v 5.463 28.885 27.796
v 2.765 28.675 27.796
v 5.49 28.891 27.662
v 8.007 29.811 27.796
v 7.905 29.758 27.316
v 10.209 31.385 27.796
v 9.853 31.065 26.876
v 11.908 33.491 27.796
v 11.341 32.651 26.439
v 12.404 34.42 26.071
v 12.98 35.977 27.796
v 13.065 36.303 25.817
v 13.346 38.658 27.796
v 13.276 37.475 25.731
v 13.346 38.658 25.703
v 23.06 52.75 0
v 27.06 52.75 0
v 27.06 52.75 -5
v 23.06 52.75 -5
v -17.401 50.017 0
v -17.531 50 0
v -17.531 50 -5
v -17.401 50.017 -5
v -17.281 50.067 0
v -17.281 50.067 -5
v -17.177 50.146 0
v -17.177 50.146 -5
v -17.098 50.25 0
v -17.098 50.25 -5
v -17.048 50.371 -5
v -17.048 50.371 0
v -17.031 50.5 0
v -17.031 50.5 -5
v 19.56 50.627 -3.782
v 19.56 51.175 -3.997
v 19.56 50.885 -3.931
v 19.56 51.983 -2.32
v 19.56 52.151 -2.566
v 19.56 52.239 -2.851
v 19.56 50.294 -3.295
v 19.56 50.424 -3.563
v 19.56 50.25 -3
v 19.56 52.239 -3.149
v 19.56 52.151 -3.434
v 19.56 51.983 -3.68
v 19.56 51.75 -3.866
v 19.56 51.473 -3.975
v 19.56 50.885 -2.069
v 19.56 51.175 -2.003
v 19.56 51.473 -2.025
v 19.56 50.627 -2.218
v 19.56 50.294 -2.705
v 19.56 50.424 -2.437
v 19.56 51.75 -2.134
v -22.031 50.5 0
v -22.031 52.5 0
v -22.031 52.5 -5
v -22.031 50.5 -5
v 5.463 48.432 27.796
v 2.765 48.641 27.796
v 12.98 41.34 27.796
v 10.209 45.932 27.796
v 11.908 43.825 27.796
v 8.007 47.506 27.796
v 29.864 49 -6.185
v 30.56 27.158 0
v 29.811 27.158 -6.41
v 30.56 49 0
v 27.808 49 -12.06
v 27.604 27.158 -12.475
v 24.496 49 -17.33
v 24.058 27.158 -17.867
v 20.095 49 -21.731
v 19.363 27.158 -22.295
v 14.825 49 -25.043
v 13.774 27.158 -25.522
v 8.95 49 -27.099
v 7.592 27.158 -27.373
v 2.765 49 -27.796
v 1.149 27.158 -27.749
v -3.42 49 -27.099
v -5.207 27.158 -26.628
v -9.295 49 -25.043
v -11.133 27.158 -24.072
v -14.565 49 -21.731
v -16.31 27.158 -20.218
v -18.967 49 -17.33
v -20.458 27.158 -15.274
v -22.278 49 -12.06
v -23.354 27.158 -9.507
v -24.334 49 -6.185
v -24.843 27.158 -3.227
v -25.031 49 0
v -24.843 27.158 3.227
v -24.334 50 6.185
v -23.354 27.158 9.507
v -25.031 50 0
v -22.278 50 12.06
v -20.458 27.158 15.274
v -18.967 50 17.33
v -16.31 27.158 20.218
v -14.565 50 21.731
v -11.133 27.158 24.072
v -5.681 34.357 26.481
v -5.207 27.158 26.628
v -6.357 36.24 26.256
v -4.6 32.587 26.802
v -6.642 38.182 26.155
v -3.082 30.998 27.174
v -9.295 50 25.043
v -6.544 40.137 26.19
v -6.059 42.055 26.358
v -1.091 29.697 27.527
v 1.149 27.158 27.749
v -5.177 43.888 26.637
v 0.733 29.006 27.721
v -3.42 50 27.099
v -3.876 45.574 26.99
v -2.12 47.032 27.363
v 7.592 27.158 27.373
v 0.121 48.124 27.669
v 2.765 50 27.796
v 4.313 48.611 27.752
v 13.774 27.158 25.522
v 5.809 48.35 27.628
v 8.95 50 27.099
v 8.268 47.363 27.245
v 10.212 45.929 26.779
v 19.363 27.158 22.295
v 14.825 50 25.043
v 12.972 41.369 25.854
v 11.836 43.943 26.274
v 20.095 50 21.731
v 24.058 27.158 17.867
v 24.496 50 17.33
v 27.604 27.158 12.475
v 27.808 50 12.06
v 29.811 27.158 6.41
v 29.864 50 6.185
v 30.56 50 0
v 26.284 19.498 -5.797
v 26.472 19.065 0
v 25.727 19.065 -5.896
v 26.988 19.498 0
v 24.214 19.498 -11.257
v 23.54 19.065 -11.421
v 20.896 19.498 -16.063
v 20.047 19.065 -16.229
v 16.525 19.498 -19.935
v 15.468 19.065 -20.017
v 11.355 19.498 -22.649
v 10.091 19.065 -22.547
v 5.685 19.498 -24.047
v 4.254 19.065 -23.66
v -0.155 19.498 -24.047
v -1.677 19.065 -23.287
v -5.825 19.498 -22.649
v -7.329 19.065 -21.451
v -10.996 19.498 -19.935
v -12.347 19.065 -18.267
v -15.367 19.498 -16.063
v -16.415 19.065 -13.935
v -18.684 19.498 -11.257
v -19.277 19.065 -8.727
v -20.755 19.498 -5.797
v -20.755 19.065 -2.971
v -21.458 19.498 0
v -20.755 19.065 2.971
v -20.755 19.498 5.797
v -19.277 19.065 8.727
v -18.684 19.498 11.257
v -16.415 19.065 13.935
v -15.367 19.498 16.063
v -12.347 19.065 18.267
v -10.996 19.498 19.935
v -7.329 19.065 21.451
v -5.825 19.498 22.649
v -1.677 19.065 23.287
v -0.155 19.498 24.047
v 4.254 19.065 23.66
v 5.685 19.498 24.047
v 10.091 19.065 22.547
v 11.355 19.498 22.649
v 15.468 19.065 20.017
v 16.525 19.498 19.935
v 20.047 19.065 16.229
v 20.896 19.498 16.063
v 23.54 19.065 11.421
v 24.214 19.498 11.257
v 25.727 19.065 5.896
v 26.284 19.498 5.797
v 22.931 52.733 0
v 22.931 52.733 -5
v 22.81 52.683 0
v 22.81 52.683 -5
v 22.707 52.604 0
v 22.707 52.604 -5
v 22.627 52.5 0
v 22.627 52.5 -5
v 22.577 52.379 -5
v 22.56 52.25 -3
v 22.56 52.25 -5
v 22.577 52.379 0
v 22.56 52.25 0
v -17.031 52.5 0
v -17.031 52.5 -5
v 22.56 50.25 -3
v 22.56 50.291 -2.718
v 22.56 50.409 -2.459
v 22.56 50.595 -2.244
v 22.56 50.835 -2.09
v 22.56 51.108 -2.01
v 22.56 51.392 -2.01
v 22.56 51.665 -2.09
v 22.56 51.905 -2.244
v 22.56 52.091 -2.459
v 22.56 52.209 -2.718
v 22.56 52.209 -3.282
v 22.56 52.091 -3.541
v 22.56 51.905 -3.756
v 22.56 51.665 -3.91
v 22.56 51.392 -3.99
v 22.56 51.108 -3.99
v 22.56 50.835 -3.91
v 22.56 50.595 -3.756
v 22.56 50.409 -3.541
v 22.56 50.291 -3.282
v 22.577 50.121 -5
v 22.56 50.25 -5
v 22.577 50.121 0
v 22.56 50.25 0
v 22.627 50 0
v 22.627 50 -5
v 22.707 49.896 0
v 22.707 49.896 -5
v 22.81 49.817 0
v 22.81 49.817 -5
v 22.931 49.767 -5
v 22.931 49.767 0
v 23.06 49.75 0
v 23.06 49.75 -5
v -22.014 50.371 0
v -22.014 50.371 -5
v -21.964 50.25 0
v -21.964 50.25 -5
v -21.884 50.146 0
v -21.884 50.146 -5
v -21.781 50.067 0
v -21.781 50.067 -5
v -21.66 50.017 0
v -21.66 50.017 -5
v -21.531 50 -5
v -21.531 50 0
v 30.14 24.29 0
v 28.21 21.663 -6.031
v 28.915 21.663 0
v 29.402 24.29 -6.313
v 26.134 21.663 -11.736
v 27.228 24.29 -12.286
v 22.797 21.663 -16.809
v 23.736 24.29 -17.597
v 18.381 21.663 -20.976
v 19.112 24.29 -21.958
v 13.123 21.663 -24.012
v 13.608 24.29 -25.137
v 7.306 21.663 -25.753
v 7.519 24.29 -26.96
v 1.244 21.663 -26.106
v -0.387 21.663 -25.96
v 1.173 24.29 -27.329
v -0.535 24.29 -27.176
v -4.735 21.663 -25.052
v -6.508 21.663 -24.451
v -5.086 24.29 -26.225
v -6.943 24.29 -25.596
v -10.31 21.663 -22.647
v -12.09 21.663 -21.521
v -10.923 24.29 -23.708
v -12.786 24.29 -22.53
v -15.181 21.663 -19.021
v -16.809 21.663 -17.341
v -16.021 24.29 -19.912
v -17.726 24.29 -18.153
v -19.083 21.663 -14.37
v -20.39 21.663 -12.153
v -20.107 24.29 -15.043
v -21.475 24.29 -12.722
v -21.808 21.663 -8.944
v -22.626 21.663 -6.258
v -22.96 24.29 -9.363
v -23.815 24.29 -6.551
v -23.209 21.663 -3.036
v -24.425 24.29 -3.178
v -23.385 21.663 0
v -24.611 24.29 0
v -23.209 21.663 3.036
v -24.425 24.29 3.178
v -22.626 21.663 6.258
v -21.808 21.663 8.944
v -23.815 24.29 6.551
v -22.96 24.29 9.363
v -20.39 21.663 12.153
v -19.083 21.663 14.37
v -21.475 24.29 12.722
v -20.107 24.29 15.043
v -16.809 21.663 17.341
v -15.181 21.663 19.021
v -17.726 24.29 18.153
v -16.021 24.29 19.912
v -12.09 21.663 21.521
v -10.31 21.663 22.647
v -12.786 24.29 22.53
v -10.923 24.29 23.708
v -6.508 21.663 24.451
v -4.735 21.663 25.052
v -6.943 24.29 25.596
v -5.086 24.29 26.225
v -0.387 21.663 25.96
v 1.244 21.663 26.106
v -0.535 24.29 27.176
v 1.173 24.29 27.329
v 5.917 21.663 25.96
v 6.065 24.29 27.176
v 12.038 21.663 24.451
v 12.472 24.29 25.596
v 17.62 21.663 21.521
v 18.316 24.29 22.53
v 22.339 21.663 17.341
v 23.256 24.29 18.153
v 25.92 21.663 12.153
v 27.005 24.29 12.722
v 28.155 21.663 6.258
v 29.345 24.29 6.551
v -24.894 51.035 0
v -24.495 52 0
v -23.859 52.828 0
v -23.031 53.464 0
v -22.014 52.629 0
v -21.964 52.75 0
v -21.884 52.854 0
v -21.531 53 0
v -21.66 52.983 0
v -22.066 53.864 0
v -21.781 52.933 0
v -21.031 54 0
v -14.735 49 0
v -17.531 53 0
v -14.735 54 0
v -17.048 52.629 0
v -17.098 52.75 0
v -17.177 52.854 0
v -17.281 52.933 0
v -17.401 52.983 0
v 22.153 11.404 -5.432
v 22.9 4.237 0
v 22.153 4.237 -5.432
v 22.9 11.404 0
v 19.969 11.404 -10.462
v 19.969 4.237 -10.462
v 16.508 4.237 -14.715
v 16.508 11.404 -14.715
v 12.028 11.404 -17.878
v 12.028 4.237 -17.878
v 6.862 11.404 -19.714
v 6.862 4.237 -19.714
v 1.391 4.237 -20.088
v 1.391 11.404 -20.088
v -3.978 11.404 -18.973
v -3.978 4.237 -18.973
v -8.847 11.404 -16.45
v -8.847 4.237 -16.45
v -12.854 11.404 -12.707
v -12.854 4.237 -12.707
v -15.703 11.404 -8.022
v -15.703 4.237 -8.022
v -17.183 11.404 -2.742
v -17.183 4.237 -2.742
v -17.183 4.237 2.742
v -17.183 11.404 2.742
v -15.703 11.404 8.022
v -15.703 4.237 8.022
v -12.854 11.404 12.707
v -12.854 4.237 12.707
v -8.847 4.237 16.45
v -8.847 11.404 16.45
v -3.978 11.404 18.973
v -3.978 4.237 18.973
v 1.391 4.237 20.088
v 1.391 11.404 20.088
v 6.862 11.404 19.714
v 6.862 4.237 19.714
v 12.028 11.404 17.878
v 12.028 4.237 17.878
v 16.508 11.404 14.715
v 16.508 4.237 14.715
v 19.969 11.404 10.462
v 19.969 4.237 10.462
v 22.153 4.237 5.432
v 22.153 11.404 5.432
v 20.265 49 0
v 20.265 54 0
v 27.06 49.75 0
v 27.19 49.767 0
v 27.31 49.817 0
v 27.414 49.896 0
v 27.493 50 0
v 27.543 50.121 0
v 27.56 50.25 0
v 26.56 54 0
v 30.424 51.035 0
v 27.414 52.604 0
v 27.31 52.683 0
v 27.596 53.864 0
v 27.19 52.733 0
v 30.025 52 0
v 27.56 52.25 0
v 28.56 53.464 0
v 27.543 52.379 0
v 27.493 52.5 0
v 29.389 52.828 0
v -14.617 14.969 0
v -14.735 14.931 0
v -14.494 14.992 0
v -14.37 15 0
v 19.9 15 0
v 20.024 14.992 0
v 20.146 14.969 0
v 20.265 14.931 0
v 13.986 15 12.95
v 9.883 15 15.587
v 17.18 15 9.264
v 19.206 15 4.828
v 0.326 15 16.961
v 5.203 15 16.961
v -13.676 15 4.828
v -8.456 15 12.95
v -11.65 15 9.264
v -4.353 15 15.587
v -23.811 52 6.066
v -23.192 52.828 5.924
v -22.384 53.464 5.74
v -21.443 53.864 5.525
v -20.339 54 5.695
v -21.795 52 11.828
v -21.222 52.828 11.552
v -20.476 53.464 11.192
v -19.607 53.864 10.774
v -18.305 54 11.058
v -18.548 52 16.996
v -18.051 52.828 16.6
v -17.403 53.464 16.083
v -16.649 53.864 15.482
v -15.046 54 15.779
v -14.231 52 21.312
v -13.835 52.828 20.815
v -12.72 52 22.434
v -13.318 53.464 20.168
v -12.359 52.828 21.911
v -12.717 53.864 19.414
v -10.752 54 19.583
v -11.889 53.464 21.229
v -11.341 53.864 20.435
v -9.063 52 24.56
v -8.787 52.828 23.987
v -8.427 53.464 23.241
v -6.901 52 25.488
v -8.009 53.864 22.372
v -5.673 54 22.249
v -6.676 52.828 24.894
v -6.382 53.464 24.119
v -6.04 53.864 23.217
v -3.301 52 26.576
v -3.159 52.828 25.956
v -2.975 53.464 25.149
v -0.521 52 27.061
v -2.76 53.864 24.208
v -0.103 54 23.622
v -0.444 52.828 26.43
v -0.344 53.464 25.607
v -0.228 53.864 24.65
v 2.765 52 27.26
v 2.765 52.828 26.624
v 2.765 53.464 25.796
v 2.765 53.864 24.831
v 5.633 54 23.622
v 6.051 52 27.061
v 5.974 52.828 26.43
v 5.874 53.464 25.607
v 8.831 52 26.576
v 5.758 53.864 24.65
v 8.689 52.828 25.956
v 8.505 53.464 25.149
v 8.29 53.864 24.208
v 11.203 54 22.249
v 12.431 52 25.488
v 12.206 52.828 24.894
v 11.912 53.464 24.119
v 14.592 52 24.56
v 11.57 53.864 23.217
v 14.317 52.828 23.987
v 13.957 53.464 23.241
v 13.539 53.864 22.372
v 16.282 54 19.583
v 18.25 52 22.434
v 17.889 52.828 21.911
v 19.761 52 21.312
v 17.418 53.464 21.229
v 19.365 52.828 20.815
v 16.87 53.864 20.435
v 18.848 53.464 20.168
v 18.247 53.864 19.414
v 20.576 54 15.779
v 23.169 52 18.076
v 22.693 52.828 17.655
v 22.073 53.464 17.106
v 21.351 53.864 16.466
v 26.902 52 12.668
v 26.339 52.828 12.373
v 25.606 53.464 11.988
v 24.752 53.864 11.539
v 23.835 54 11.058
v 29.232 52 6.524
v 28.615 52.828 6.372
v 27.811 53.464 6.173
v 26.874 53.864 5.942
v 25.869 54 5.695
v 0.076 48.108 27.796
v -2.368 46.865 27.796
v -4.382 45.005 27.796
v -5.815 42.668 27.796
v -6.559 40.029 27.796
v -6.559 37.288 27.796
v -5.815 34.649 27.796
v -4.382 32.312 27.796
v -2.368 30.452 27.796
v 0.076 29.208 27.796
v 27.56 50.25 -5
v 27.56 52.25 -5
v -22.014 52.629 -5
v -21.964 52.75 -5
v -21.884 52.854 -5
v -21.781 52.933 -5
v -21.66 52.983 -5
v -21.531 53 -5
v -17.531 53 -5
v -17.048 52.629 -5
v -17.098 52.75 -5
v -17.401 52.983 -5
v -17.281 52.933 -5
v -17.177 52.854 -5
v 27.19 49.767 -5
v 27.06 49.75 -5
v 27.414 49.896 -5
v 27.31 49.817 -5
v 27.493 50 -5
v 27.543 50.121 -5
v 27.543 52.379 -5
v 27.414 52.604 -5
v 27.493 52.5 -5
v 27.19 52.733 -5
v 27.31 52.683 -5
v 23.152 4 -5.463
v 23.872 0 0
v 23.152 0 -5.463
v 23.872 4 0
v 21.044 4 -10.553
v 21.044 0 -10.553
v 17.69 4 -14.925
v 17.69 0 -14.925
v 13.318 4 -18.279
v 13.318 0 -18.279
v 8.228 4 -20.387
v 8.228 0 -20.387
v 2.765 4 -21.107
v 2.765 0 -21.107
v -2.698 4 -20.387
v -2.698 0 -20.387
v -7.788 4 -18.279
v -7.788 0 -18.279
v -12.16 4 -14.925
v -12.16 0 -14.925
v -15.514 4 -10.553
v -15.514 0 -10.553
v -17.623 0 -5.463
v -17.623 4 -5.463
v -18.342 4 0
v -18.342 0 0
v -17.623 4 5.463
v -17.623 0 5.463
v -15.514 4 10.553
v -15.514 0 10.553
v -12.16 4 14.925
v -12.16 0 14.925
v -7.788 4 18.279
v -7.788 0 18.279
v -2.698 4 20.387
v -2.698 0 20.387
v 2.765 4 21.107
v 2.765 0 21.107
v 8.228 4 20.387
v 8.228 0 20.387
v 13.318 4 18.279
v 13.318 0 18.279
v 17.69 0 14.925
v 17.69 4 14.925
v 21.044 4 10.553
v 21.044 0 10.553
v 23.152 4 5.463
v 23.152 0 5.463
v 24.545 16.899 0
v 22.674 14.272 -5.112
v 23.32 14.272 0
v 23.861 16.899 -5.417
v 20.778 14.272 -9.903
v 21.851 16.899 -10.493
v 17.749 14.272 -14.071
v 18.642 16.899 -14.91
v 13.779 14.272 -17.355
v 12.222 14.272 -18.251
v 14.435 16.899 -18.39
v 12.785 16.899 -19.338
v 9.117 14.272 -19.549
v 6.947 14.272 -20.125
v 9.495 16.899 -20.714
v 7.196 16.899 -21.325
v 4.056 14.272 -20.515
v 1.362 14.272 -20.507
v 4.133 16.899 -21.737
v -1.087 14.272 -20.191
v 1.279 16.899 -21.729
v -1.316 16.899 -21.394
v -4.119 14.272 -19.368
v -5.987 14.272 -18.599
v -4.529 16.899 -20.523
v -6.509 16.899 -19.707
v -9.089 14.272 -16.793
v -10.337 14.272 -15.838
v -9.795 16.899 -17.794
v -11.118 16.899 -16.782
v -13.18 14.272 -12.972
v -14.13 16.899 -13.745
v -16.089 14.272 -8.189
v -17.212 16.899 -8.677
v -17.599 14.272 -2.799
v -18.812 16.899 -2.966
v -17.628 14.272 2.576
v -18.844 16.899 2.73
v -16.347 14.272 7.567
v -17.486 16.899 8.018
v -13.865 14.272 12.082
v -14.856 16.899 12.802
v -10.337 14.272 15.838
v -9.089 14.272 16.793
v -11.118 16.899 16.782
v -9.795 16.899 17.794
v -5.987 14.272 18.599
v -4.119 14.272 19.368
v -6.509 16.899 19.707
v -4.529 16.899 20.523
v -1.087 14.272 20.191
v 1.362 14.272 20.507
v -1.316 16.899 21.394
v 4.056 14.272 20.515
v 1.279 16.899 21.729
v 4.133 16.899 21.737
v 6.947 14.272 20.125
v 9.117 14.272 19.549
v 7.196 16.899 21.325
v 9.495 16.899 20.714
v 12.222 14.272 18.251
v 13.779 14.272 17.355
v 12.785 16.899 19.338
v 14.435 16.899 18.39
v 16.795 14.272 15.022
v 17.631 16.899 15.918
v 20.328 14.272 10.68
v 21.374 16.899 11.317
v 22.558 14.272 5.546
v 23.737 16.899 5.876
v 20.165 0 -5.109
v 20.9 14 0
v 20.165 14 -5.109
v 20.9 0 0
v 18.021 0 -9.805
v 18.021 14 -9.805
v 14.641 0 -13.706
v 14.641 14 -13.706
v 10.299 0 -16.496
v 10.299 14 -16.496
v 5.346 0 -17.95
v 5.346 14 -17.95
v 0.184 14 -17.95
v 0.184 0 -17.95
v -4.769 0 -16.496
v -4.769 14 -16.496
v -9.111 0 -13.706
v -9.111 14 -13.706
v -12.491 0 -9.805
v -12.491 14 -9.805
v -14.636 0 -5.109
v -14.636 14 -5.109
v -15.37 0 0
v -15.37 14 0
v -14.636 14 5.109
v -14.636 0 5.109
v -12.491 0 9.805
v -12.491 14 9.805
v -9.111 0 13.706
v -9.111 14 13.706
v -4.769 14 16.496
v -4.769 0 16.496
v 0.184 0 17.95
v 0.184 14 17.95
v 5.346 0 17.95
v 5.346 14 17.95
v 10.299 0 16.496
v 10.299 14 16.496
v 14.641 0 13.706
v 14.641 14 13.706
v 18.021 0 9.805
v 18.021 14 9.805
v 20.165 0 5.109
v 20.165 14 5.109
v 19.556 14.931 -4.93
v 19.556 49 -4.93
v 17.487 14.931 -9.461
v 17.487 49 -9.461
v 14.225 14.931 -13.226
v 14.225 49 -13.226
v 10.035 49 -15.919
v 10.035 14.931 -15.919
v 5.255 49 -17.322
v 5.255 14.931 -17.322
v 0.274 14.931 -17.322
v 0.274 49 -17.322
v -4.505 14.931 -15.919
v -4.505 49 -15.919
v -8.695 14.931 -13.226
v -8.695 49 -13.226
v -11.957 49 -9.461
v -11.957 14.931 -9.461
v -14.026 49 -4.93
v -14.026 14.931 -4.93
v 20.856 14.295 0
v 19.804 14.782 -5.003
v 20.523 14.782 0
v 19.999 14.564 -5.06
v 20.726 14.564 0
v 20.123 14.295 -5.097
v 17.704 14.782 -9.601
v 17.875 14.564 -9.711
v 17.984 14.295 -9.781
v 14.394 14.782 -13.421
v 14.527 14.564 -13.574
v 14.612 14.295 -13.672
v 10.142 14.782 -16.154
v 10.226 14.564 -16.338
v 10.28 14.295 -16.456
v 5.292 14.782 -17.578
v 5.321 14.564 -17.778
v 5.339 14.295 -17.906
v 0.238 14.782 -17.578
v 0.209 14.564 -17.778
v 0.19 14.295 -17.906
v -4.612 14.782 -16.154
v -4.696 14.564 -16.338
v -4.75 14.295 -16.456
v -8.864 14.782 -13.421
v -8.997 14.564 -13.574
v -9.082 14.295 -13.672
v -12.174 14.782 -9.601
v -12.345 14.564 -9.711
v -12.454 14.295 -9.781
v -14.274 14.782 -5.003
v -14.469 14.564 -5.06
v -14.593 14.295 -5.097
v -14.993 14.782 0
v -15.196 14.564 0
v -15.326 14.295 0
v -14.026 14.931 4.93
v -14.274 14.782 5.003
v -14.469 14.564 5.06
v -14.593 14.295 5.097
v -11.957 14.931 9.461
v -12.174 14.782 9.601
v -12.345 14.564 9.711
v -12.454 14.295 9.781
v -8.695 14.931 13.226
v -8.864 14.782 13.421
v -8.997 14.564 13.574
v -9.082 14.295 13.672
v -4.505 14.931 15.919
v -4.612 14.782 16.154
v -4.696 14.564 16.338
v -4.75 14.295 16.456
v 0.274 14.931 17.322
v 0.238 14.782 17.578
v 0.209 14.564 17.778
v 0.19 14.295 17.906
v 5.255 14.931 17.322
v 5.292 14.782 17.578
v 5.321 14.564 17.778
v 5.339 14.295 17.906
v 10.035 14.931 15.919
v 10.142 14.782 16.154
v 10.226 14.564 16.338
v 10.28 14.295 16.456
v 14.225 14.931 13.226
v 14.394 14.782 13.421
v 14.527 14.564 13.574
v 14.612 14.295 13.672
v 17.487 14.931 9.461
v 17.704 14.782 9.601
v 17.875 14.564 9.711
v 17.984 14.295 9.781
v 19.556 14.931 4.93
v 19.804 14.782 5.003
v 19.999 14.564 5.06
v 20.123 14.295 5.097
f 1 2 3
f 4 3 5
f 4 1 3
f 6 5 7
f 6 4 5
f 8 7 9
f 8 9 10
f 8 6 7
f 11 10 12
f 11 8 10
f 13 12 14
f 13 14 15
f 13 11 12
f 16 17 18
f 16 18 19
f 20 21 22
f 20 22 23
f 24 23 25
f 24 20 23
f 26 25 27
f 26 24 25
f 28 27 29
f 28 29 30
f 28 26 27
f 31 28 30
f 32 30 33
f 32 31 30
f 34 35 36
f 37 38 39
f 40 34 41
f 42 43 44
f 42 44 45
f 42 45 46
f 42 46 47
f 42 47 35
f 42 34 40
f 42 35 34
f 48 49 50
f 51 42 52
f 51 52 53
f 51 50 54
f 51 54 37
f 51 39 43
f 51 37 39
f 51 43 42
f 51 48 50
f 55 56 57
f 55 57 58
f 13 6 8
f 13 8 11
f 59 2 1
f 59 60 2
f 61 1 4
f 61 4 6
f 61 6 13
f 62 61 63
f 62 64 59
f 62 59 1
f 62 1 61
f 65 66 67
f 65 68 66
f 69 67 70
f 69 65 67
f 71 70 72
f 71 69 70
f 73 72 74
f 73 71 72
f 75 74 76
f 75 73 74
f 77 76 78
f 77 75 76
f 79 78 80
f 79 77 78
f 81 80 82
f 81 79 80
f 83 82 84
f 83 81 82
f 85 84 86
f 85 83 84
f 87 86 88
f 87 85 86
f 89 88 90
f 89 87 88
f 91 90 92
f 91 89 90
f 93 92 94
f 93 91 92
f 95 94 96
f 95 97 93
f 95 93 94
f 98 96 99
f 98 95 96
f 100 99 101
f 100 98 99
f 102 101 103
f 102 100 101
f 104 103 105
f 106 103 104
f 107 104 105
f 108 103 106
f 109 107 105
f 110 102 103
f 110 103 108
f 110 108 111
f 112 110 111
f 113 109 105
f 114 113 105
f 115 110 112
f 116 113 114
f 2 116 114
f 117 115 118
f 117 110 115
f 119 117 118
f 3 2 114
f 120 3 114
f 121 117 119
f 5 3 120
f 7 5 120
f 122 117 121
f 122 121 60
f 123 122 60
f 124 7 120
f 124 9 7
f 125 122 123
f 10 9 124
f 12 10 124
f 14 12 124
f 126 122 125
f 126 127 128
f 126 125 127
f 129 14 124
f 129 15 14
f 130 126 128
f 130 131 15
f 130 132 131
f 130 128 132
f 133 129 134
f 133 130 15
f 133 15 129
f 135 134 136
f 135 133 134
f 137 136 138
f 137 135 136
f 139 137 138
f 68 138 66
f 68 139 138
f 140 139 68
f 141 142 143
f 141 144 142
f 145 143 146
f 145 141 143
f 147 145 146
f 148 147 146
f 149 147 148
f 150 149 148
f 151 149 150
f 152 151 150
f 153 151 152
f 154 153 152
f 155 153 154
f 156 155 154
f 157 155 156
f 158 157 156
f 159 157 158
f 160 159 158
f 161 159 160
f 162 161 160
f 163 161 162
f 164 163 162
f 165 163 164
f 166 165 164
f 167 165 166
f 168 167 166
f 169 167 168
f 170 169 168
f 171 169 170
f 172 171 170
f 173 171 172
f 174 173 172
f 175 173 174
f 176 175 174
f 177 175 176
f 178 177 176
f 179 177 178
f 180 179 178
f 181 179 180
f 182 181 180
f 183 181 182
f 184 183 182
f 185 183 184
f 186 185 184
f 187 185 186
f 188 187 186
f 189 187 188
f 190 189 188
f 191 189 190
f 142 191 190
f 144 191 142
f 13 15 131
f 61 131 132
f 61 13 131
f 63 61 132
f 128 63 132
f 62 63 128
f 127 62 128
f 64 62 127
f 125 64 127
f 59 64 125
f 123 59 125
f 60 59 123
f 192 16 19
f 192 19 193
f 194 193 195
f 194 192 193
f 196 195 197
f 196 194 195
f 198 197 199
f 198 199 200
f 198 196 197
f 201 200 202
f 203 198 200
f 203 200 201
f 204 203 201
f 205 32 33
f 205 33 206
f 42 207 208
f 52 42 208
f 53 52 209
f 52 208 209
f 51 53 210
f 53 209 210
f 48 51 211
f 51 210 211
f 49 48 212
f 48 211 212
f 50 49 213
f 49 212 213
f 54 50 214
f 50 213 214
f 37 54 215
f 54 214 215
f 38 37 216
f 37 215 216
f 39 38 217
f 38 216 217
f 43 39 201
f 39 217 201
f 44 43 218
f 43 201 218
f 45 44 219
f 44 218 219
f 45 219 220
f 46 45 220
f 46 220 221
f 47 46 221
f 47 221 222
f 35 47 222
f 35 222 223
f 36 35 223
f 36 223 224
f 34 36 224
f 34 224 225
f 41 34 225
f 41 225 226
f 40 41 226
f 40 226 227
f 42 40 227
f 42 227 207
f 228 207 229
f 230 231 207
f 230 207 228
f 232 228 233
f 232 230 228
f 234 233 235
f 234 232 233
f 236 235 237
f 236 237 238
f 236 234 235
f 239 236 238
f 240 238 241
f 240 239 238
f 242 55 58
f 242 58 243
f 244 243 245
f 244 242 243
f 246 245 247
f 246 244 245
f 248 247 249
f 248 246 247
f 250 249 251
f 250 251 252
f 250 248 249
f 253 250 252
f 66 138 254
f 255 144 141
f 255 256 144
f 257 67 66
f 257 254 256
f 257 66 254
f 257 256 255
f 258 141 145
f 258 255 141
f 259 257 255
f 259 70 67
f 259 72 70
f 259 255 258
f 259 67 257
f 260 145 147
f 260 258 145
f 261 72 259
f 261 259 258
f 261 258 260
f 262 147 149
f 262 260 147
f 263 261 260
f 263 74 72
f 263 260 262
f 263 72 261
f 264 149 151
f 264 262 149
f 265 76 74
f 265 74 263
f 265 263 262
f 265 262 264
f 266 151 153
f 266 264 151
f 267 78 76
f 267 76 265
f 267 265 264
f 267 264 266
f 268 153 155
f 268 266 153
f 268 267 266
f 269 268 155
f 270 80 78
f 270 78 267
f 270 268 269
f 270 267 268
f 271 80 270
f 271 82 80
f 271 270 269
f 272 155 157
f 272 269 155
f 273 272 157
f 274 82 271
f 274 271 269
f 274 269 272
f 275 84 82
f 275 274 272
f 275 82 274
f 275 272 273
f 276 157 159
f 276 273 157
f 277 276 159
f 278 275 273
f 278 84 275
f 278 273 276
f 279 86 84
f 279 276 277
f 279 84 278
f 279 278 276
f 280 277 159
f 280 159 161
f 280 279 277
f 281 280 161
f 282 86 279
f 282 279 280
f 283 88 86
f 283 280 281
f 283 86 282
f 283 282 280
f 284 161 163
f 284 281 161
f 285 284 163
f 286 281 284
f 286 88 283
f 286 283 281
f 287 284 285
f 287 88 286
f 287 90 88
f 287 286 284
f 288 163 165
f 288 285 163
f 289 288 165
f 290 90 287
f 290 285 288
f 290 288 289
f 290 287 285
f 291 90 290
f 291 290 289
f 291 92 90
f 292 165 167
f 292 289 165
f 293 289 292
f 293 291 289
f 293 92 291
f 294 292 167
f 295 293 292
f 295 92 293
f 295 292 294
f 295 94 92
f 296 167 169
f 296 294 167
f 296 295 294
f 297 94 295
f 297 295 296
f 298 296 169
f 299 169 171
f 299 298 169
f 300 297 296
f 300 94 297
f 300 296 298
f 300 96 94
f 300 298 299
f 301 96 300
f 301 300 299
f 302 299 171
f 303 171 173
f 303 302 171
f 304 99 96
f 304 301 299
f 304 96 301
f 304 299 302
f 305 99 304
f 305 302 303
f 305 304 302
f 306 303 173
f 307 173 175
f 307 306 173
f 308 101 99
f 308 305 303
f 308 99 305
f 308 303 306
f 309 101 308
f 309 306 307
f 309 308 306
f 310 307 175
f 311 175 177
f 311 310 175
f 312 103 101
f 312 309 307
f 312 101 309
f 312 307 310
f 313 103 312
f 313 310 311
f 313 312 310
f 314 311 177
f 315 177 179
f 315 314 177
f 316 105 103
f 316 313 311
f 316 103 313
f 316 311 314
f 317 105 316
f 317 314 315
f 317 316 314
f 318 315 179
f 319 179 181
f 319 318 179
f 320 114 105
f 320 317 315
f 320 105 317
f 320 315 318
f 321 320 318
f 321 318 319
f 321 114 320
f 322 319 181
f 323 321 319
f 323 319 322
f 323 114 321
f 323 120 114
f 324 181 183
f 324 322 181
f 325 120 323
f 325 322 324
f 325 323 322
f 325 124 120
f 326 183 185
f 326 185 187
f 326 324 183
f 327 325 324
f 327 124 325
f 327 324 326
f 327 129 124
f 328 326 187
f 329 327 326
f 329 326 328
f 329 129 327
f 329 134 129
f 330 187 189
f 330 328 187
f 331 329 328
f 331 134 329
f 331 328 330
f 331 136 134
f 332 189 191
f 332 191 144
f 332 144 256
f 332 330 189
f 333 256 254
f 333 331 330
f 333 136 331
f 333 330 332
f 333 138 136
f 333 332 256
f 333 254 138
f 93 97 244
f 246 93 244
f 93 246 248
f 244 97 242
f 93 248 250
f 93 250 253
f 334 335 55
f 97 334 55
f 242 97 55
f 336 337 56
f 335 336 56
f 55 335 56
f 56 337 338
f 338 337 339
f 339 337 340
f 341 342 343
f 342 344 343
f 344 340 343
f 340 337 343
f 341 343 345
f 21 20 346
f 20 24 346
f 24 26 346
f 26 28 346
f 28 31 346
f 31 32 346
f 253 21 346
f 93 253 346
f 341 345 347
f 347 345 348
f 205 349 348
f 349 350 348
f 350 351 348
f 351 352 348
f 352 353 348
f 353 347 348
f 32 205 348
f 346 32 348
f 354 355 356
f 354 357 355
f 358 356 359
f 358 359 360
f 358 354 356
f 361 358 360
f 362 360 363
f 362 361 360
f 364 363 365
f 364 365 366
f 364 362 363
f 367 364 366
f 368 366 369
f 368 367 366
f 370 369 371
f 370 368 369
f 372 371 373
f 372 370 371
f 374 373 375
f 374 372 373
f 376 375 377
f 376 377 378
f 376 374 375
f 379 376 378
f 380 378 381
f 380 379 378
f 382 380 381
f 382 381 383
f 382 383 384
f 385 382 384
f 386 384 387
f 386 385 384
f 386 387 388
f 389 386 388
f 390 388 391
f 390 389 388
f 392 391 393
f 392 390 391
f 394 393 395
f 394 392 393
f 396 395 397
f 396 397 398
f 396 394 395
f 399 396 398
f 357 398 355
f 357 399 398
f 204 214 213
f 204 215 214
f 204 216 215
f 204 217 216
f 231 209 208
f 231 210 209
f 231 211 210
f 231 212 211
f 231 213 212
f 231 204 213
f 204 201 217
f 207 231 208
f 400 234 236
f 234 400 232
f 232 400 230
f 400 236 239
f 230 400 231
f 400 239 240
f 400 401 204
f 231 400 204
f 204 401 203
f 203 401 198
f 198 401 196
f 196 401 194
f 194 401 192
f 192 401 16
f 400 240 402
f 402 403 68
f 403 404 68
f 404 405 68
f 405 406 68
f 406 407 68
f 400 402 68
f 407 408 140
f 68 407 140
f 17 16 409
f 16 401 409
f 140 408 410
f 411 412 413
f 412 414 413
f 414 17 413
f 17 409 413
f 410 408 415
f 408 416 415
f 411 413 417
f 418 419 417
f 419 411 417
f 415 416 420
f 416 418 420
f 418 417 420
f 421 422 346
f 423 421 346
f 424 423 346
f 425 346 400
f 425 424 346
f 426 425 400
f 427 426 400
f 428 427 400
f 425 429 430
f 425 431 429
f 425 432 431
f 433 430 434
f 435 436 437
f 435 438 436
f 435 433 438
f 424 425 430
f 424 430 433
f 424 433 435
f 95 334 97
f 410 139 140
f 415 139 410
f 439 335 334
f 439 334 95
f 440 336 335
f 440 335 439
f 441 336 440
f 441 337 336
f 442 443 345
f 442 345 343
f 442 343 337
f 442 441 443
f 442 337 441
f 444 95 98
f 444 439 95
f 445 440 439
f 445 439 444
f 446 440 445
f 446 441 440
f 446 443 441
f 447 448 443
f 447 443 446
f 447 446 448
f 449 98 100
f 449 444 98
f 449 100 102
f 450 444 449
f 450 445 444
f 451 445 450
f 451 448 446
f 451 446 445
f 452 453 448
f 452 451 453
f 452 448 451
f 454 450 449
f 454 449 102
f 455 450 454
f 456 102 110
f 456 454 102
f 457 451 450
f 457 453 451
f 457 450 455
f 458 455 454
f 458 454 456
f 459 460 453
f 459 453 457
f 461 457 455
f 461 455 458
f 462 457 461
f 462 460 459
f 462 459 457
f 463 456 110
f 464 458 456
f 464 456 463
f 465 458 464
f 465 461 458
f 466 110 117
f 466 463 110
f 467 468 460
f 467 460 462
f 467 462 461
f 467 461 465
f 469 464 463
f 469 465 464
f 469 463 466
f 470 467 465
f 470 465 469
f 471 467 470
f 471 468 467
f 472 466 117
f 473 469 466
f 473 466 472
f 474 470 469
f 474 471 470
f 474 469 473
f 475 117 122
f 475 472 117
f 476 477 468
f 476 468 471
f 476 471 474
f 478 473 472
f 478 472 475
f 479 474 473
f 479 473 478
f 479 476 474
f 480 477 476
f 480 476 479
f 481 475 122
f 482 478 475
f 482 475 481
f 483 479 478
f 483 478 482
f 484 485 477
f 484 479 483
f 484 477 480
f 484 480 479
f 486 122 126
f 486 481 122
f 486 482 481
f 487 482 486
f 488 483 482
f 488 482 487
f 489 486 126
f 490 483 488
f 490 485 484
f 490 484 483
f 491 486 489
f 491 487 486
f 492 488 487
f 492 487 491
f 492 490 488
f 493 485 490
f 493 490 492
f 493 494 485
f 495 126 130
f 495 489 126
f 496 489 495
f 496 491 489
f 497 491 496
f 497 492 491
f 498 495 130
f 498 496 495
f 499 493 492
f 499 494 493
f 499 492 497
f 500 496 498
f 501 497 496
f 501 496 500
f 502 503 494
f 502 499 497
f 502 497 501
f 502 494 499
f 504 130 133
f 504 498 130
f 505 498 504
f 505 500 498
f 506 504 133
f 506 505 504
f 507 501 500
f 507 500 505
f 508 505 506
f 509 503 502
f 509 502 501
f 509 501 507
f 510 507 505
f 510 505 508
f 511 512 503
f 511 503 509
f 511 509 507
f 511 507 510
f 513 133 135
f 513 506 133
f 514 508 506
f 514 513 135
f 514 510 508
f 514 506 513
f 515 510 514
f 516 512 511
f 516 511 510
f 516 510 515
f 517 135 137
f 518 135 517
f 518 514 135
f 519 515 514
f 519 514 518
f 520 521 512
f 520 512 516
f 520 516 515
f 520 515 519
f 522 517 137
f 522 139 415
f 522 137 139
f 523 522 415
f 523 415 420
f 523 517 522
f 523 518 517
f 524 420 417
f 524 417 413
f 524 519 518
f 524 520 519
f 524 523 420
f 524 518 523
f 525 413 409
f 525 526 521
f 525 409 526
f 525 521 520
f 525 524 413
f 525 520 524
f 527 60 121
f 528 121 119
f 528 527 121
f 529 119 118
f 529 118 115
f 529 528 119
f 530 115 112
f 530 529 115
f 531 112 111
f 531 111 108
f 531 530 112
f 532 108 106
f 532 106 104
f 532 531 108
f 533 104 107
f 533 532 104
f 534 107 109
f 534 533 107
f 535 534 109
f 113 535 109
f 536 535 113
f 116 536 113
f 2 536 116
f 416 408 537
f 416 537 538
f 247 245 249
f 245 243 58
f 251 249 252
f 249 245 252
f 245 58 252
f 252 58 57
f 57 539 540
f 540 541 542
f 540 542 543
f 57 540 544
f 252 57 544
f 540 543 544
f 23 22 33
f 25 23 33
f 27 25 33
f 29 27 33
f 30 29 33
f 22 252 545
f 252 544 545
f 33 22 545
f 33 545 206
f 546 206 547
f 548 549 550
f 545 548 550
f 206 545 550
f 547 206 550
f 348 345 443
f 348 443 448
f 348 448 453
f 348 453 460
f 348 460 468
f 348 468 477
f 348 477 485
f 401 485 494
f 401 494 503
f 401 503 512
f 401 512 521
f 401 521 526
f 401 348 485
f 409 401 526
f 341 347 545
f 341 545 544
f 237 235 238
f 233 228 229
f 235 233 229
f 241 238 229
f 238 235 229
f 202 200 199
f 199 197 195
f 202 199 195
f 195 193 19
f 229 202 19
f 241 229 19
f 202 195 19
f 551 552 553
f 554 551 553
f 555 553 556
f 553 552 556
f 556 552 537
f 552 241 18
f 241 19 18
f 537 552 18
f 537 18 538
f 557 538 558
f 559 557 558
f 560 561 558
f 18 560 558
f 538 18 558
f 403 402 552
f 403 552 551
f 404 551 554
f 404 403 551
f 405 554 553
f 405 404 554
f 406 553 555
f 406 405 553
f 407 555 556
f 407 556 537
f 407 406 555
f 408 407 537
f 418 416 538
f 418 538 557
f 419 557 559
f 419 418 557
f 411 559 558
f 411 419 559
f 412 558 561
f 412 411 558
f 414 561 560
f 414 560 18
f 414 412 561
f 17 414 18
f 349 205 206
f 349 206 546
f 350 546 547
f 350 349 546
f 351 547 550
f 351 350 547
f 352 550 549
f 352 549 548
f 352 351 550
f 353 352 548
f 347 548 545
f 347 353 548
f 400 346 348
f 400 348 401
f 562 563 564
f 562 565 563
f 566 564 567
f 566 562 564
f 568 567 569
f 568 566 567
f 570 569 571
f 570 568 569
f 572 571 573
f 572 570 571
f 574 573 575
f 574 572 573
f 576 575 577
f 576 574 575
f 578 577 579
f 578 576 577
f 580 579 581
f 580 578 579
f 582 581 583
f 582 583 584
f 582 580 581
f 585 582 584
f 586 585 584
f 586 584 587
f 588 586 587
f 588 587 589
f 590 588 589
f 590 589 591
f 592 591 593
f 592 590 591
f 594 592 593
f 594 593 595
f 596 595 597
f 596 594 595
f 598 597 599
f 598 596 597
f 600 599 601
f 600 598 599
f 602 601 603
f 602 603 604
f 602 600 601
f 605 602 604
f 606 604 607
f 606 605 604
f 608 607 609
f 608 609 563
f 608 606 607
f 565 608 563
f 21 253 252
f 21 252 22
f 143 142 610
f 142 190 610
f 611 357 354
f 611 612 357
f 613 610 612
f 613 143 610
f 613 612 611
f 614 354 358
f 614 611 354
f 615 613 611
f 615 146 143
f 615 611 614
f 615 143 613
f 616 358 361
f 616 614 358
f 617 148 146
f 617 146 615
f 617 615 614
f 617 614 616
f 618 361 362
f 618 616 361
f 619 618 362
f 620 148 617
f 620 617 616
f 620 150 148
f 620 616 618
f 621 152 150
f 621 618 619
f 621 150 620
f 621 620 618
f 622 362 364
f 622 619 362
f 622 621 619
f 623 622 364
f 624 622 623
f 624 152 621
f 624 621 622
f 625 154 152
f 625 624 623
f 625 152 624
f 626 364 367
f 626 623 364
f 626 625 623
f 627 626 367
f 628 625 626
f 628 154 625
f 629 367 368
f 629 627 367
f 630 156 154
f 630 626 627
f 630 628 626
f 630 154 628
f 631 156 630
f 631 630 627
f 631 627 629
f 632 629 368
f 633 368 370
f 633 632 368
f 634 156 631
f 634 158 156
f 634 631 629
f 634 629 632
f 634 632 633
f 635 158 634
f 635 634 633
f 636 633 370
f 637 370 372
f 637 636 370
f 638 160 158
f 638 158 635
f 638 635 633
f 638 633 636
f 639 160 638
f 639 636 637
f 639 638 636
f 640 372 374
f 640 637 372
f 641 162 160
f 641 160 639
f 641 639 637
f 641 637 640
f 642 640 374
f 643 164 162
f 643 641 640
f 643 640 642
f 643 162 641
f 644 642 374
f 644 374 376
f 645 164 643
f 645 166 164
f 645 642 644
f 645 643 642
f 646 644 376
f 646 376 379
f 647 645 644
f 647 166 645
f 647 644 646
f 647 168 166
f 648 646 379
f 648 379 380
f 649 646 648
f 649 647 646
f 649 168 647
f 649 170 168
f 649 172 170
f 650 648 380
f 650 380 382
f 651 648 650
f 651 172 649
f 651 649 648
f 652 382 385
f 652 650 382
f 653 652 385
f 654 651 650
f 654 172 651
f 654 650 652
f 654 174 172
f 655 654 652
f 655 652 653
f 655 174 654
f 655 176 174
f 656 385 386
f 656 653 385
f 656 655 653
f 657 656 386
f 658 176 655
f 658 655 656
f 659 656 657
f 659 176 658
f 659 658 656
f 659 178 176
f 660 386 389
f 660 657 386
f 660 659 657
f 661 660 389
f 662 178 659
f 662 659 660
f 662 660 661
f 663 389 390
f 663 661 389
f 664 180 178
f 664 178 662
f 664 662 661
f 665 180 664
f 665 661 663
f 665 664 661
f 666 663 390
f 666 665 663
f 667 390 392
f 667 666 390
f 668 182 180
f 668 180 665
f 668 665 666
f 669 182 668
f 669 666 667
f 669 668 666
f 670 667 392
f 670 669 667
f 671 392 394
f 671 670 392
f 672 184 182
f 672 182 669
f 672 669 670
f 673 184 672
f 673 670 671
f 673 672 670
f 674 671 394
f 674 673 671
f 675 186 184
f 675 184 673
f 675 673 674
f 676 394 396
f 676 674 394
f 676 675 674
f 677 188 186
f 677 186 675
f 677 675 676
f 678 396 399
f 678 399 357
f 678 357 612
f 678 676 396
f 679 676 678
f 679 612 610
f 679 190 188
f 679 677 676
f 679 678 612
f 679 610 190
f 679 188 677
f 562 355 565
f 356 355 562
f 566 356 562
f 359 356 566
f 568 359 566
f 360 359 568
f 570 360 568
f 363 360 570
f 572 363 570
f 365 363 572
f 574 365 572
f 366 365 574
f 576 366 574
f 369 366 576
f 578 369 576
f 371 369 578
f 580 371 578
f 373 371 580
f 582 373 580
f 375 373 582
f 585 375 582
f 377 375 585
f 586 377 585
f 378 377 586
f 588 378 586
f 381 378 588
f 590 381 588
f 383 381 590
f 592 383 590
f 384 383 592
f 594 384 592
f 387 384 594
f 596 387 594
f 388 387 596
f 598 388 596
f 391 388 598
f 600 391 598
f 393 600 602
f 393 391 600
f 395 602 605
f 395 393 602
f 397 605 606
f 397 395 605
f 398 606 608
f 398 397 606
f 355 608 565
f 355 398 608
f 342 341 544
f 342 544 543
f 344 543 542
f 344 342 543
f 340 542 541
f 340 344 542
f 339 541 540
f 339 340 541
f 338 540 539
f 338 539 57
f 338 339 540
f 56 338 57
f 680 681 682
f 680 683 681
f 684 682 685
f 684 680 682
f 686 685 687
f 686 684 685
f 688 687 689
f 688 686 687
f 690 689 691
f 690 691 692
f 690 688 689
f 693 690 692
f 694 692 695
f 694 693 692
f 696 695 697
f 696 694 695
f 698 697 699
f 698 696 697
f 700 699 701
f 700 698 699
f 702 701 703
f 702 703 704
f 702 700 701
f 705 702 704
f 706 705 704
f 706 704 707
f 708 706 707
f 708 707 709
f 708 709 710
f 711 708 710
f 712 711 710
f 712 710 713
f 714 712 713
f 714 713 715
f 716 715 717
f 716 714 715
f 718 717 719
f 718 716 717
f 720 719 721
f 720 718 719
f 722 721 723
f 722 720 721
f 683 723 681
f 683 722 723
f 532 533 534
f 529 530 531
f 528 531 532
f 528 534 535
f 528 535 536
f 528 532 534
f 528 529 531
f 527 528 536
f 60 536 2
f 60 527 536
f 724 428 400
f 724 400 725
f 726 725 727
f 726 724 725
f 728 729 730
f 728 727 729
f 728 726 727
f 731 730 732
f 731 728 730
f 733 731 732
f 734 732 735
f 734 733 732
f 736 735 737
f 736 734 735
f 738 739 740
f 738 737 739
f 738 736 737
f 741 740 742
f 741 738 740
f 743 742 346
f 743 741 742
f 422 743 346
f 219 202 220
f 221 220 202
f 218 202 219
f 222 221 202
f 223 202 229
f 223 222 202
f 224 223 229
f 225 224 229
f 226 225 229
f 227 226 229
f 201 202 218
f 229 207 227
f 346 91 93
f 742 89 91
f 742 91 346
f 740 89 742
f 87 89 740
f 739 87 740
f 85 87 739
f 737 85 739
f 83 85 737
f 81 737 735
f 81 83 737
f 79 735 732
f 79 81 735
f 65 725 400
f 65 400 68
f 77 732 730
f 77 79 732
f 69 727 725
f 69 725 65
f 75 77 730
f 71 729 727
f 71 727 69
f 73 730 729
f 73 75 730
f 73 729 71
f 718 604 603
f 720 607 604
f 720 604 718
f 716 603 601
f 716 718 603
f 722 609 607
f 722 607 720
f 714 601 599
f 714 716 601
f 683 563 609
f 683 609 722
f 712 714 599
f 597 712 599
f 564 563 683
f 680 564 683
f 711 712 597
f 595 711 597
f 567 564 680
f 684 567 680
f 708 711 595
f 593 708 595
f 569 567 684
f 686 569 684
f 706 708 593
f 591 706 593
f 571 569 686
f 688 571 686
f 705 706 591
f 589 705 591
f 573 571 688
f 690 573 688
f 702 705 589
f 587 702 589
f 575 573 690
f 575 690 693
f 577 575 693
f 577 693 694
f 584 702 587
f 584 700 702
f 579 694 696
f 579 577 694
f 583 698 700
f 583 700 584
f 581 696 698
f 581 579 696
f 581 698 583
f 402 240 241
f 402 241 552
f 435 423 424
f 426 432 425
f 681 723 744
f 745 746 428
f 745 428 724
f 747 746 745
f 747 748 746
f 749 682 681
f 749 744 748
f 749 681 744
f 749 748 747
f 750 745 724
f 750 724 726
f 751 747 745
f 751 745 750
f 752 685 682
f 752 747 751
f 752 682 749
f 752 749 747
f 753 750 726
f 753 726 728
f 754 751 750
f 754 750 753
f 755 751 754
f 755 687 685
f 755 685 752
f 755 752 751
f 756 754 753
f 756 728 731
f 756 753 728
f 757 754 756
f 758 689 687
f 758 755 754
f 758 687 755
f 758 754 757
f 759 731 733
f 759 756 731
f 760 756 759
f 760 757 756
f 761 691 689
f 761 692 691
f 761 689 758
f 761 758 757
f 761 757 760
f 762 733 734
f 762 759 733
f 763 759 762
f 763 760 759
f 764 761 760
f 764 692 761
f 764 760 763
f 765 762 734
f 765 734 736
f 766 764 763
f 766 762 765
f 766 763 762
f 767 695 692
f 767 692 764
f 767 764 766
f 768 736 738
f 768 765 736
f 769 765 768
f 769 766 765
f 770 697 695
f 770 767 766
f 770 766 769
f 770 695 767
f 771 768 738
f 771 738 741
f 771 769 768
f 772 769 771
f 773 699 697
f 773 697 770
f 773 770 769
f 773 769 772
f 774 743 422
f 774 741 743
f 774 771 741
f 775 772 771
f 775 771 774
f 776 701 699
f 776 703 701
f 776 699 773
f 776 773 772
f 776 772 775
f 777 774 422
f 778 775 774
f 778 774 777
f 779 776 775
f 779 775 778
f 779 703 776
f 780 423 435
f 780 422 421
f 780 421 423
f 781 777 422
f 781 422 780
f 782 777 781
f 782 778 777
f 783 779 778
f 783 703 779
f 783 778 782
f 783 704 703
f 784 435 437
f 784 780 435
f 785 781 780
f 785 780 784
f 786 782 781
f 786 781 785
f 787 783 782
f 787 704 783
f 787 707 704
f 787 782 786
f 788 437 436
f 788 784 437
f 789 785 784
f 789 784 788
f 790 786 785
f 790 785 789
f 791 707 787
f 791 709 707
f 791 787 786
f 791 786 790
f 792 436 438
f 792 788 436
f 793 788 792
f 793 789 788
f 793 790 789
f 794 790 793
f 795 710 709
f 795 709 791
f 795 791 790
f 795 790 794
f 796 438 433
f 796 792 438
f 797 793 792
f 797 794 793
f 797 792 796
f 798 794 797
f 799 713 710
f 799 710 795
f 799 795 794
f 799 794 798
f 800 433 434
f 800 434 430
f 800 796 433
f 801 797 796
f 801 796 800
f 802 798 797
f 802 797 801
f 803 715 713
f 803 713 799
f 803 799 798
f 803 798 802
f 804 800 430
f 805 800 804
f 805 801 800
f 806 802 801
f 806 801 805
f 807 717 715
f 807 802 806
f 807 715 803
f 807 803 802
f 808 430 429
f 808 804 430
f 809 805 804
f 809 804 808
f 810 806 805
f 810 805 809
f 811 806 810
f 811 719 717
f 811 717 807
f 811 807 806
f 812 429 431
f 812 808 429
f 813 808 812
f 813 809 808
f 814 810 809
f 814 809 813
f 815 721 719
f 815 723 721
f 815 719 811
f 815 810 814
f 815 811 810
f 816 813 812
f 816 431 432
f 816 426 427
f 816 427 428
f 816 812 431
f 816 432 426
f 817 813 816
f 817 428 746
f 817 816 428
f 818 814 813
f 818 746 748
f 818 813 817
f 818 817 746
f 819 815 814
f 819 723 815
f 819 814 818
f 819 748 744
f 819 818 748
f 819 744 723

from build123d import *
from build123d.topology import SkipClean

# Parameters (mm, degrees)
SKETCH10_R              = 10
BOSS_EXTRUDE1_DEPTH     = 5
CUT_EXTRUDE3_DEPTH      = 45
CUT_EXTRUDE3_DEPTH_BACK = 20
CUT_EXTRUDE5_DEPTH      = 5
BOSS_EXTRUDE2_DEPTH     = 5
SKETCH14_R              = 1
BOSS_EXTRUDE3_DEPTH     = 3


with BuildPart() as part:
    # Sketch1 → Revolve1 (revolve)
    with BuildSketch(Plane.XY):
        with BuildLine():
            Line((20.9, 0), (23.871591838, 0))
            Line((23.871591838, 0), (23.871591838, 4))
            Line((23.871591838, 4), (22.9, 4.236662843))
            Line((22.9, 4.236662843), (22.9, 11.404308102))
            ThreePointArc((22.9, 11.404308102), (23.83692213, 15.63049072), (26.472123903, 19.064752533))
            Line((26.472123903, 19.064752533), (26.988320528, 19.497892931))
            ThreePointArc((26.988320528, 19.497892931), (29.623522302, 22.932154745), (30.560444431, 27.158337362))
            Line((30.560444431, 27.158337362), (30.560444431, 50))
            ThreePointArc((30.560444431, 50), (29.388871556, 52.828427125), (26.560444431, 54))
            Line((26.560444431, 54), (2.764914955, 54))
            Line((2.764914955, 54), (2.764914955, 15))
            Line((2.764914955, 15), (19.9, 15))
            ThreePointArc((19.9, 15), (20.607106781, 14.707106781), (20.9, 14))
            Line((20.9, 14), (20.9, 0))
        make_face()
    revolve(axis=Axis((2.764914955, 7.821821657, 0), (0, 1, 0)))

    # Sketch10 → Boss-Extrude1 (add)
    with SkipClean():  # the faces are left unmerged after this step: merging them gives an invalid solid
        with BuildSketch(Plane.XY.offset(27.795529476)):
            with Locations((3.346345887, 38.658337362)):
                Circle(SKETCH10_R)
        extrude(amount=-BOSS_EXTRUDE1_DEPTH)

    # Sketch11 → Cut-Extrude3 (cut, two sides: drawn at the far end of the back side and taken through both)
    with SkipClean():  # the faces are left unmerged after this step: merging them gives an invalid solid
        with BuildSketch(Plane(origin=(0, 17, 0), x_dir=(1, 0, 0), z_dir=(0, 1, 0)).offset(-CUT_EXTRUDE3_DEPTH_BACK)):
            with BuildLine():
                Line((-14.735085045, 0), (20.264914955, 0))
                ThreePointArc((20.264914955, 0), (2.764914955, 17.5), (-14.735085045, 0))
            make_face()
        extrude(amount=CUT_EXTRUDE3_DEPTH + CUT_EXTRUDE3_DEPTH_BACK, mode=Mode.SUBTRACT)

    # Sketch9 → Cut-Extrude5 (cut)
    with SkipClean():  # the faces are left unmerged after this step: merging them gives an invalid solid
        with BuildSketch(Plane(origin=(0, 54, 0), x_dir=(1, 0, 0), z_dir=(0, 1, 0))):
            with BuildLine():
                Line((-25.235085045, 0), (30.764914955, 0))
                ThreePointArc((30.764914955, 0), (2.764914955, 28), (-25.235085045, 0))
            make_face()
        extrude(amount=-CUT_EXTRUDE5_DEPTH, mode=Mode.SUBTRACT)

    # Sketch13 → Boss-Extrude2 (add)
    with SkipClean():  # the faces are left unmerged after this step: merging them gives an invalid solid
        with BuildSketch(Plane(origin=(0, 0, 0), x_dir=(-1, 0, 0), z_dir=(0, 0, -1))):
            with BuildLine():
                Line((17.53061452, 53), (21.53061452, 53))
                ThreePointArc((21.53061452, 53), (21.884167911, 52.853553391), (22.03061452, 52.5))
                Line((22.03061452, 52.5), (22.03061452, 50.5))
                ThreePointArc((22.03061452, 50.5), (21.884167911, 50.146446609), (21.53061452, 50))
                Line((21.53061452, 50), (17.53061452, 50))
                ThreePointArc((17.53061452, 50), (17.17706113, 50.146446609), (17.03061452, 50.5))
                Line((17.03061452, 50.5), (17.03061452, 52.5))
                ThreePointArc((17.03061452, 52.5), (17.17706113, 52.853553391), (17.53061452, 53))
            make_face()
            with BuildLine():
                Line((-27.060444431, 52.75), (-23.060444431, 52.75))
                ThreePointArc((-23.060444431, 52.75), (-22.706891041, 52.603553391), (-22.560444431, 52.25))
                Line((-22.560444431, 52.25), (-22.560444431, 50.25))
                ThreePointArc((-22.560444431, 50.25), (-22.706891041, 49.896446609), (-23.060444431, 49.75))
                Line((-23.060444431, 49.75), (-27.060444431, 49.75))
                ThreePointArc((-27.060444431, 49.75), (-27.413997822, 49.896446609), (-27.560444431, 50.25))
                Line((-27.560444431, 50.25), (-27.560444431, 52.25))
                ThreePointArc((-27.560444431, 52.25), (-27.413997822, 52.603553391), (-27.060444431, 52.75))
            make_face()
        extrude(amount=BOSS_EXTRUDE2_DEPTH)

    # Sketch14 → Boss-Extrude3 (add)
    with SkipClean():  # the faces are left unmerged after this step: merging them gives an invalid solid
        with BuildSketch(Plane.ZY.offset(-22.560444431)):
            with Locations((-3, 51.25)):
                Circle(SKETCH14_R)
        extrude(amount=BOSS_EXTRUDE3_DEPTH)


solid = part.part
